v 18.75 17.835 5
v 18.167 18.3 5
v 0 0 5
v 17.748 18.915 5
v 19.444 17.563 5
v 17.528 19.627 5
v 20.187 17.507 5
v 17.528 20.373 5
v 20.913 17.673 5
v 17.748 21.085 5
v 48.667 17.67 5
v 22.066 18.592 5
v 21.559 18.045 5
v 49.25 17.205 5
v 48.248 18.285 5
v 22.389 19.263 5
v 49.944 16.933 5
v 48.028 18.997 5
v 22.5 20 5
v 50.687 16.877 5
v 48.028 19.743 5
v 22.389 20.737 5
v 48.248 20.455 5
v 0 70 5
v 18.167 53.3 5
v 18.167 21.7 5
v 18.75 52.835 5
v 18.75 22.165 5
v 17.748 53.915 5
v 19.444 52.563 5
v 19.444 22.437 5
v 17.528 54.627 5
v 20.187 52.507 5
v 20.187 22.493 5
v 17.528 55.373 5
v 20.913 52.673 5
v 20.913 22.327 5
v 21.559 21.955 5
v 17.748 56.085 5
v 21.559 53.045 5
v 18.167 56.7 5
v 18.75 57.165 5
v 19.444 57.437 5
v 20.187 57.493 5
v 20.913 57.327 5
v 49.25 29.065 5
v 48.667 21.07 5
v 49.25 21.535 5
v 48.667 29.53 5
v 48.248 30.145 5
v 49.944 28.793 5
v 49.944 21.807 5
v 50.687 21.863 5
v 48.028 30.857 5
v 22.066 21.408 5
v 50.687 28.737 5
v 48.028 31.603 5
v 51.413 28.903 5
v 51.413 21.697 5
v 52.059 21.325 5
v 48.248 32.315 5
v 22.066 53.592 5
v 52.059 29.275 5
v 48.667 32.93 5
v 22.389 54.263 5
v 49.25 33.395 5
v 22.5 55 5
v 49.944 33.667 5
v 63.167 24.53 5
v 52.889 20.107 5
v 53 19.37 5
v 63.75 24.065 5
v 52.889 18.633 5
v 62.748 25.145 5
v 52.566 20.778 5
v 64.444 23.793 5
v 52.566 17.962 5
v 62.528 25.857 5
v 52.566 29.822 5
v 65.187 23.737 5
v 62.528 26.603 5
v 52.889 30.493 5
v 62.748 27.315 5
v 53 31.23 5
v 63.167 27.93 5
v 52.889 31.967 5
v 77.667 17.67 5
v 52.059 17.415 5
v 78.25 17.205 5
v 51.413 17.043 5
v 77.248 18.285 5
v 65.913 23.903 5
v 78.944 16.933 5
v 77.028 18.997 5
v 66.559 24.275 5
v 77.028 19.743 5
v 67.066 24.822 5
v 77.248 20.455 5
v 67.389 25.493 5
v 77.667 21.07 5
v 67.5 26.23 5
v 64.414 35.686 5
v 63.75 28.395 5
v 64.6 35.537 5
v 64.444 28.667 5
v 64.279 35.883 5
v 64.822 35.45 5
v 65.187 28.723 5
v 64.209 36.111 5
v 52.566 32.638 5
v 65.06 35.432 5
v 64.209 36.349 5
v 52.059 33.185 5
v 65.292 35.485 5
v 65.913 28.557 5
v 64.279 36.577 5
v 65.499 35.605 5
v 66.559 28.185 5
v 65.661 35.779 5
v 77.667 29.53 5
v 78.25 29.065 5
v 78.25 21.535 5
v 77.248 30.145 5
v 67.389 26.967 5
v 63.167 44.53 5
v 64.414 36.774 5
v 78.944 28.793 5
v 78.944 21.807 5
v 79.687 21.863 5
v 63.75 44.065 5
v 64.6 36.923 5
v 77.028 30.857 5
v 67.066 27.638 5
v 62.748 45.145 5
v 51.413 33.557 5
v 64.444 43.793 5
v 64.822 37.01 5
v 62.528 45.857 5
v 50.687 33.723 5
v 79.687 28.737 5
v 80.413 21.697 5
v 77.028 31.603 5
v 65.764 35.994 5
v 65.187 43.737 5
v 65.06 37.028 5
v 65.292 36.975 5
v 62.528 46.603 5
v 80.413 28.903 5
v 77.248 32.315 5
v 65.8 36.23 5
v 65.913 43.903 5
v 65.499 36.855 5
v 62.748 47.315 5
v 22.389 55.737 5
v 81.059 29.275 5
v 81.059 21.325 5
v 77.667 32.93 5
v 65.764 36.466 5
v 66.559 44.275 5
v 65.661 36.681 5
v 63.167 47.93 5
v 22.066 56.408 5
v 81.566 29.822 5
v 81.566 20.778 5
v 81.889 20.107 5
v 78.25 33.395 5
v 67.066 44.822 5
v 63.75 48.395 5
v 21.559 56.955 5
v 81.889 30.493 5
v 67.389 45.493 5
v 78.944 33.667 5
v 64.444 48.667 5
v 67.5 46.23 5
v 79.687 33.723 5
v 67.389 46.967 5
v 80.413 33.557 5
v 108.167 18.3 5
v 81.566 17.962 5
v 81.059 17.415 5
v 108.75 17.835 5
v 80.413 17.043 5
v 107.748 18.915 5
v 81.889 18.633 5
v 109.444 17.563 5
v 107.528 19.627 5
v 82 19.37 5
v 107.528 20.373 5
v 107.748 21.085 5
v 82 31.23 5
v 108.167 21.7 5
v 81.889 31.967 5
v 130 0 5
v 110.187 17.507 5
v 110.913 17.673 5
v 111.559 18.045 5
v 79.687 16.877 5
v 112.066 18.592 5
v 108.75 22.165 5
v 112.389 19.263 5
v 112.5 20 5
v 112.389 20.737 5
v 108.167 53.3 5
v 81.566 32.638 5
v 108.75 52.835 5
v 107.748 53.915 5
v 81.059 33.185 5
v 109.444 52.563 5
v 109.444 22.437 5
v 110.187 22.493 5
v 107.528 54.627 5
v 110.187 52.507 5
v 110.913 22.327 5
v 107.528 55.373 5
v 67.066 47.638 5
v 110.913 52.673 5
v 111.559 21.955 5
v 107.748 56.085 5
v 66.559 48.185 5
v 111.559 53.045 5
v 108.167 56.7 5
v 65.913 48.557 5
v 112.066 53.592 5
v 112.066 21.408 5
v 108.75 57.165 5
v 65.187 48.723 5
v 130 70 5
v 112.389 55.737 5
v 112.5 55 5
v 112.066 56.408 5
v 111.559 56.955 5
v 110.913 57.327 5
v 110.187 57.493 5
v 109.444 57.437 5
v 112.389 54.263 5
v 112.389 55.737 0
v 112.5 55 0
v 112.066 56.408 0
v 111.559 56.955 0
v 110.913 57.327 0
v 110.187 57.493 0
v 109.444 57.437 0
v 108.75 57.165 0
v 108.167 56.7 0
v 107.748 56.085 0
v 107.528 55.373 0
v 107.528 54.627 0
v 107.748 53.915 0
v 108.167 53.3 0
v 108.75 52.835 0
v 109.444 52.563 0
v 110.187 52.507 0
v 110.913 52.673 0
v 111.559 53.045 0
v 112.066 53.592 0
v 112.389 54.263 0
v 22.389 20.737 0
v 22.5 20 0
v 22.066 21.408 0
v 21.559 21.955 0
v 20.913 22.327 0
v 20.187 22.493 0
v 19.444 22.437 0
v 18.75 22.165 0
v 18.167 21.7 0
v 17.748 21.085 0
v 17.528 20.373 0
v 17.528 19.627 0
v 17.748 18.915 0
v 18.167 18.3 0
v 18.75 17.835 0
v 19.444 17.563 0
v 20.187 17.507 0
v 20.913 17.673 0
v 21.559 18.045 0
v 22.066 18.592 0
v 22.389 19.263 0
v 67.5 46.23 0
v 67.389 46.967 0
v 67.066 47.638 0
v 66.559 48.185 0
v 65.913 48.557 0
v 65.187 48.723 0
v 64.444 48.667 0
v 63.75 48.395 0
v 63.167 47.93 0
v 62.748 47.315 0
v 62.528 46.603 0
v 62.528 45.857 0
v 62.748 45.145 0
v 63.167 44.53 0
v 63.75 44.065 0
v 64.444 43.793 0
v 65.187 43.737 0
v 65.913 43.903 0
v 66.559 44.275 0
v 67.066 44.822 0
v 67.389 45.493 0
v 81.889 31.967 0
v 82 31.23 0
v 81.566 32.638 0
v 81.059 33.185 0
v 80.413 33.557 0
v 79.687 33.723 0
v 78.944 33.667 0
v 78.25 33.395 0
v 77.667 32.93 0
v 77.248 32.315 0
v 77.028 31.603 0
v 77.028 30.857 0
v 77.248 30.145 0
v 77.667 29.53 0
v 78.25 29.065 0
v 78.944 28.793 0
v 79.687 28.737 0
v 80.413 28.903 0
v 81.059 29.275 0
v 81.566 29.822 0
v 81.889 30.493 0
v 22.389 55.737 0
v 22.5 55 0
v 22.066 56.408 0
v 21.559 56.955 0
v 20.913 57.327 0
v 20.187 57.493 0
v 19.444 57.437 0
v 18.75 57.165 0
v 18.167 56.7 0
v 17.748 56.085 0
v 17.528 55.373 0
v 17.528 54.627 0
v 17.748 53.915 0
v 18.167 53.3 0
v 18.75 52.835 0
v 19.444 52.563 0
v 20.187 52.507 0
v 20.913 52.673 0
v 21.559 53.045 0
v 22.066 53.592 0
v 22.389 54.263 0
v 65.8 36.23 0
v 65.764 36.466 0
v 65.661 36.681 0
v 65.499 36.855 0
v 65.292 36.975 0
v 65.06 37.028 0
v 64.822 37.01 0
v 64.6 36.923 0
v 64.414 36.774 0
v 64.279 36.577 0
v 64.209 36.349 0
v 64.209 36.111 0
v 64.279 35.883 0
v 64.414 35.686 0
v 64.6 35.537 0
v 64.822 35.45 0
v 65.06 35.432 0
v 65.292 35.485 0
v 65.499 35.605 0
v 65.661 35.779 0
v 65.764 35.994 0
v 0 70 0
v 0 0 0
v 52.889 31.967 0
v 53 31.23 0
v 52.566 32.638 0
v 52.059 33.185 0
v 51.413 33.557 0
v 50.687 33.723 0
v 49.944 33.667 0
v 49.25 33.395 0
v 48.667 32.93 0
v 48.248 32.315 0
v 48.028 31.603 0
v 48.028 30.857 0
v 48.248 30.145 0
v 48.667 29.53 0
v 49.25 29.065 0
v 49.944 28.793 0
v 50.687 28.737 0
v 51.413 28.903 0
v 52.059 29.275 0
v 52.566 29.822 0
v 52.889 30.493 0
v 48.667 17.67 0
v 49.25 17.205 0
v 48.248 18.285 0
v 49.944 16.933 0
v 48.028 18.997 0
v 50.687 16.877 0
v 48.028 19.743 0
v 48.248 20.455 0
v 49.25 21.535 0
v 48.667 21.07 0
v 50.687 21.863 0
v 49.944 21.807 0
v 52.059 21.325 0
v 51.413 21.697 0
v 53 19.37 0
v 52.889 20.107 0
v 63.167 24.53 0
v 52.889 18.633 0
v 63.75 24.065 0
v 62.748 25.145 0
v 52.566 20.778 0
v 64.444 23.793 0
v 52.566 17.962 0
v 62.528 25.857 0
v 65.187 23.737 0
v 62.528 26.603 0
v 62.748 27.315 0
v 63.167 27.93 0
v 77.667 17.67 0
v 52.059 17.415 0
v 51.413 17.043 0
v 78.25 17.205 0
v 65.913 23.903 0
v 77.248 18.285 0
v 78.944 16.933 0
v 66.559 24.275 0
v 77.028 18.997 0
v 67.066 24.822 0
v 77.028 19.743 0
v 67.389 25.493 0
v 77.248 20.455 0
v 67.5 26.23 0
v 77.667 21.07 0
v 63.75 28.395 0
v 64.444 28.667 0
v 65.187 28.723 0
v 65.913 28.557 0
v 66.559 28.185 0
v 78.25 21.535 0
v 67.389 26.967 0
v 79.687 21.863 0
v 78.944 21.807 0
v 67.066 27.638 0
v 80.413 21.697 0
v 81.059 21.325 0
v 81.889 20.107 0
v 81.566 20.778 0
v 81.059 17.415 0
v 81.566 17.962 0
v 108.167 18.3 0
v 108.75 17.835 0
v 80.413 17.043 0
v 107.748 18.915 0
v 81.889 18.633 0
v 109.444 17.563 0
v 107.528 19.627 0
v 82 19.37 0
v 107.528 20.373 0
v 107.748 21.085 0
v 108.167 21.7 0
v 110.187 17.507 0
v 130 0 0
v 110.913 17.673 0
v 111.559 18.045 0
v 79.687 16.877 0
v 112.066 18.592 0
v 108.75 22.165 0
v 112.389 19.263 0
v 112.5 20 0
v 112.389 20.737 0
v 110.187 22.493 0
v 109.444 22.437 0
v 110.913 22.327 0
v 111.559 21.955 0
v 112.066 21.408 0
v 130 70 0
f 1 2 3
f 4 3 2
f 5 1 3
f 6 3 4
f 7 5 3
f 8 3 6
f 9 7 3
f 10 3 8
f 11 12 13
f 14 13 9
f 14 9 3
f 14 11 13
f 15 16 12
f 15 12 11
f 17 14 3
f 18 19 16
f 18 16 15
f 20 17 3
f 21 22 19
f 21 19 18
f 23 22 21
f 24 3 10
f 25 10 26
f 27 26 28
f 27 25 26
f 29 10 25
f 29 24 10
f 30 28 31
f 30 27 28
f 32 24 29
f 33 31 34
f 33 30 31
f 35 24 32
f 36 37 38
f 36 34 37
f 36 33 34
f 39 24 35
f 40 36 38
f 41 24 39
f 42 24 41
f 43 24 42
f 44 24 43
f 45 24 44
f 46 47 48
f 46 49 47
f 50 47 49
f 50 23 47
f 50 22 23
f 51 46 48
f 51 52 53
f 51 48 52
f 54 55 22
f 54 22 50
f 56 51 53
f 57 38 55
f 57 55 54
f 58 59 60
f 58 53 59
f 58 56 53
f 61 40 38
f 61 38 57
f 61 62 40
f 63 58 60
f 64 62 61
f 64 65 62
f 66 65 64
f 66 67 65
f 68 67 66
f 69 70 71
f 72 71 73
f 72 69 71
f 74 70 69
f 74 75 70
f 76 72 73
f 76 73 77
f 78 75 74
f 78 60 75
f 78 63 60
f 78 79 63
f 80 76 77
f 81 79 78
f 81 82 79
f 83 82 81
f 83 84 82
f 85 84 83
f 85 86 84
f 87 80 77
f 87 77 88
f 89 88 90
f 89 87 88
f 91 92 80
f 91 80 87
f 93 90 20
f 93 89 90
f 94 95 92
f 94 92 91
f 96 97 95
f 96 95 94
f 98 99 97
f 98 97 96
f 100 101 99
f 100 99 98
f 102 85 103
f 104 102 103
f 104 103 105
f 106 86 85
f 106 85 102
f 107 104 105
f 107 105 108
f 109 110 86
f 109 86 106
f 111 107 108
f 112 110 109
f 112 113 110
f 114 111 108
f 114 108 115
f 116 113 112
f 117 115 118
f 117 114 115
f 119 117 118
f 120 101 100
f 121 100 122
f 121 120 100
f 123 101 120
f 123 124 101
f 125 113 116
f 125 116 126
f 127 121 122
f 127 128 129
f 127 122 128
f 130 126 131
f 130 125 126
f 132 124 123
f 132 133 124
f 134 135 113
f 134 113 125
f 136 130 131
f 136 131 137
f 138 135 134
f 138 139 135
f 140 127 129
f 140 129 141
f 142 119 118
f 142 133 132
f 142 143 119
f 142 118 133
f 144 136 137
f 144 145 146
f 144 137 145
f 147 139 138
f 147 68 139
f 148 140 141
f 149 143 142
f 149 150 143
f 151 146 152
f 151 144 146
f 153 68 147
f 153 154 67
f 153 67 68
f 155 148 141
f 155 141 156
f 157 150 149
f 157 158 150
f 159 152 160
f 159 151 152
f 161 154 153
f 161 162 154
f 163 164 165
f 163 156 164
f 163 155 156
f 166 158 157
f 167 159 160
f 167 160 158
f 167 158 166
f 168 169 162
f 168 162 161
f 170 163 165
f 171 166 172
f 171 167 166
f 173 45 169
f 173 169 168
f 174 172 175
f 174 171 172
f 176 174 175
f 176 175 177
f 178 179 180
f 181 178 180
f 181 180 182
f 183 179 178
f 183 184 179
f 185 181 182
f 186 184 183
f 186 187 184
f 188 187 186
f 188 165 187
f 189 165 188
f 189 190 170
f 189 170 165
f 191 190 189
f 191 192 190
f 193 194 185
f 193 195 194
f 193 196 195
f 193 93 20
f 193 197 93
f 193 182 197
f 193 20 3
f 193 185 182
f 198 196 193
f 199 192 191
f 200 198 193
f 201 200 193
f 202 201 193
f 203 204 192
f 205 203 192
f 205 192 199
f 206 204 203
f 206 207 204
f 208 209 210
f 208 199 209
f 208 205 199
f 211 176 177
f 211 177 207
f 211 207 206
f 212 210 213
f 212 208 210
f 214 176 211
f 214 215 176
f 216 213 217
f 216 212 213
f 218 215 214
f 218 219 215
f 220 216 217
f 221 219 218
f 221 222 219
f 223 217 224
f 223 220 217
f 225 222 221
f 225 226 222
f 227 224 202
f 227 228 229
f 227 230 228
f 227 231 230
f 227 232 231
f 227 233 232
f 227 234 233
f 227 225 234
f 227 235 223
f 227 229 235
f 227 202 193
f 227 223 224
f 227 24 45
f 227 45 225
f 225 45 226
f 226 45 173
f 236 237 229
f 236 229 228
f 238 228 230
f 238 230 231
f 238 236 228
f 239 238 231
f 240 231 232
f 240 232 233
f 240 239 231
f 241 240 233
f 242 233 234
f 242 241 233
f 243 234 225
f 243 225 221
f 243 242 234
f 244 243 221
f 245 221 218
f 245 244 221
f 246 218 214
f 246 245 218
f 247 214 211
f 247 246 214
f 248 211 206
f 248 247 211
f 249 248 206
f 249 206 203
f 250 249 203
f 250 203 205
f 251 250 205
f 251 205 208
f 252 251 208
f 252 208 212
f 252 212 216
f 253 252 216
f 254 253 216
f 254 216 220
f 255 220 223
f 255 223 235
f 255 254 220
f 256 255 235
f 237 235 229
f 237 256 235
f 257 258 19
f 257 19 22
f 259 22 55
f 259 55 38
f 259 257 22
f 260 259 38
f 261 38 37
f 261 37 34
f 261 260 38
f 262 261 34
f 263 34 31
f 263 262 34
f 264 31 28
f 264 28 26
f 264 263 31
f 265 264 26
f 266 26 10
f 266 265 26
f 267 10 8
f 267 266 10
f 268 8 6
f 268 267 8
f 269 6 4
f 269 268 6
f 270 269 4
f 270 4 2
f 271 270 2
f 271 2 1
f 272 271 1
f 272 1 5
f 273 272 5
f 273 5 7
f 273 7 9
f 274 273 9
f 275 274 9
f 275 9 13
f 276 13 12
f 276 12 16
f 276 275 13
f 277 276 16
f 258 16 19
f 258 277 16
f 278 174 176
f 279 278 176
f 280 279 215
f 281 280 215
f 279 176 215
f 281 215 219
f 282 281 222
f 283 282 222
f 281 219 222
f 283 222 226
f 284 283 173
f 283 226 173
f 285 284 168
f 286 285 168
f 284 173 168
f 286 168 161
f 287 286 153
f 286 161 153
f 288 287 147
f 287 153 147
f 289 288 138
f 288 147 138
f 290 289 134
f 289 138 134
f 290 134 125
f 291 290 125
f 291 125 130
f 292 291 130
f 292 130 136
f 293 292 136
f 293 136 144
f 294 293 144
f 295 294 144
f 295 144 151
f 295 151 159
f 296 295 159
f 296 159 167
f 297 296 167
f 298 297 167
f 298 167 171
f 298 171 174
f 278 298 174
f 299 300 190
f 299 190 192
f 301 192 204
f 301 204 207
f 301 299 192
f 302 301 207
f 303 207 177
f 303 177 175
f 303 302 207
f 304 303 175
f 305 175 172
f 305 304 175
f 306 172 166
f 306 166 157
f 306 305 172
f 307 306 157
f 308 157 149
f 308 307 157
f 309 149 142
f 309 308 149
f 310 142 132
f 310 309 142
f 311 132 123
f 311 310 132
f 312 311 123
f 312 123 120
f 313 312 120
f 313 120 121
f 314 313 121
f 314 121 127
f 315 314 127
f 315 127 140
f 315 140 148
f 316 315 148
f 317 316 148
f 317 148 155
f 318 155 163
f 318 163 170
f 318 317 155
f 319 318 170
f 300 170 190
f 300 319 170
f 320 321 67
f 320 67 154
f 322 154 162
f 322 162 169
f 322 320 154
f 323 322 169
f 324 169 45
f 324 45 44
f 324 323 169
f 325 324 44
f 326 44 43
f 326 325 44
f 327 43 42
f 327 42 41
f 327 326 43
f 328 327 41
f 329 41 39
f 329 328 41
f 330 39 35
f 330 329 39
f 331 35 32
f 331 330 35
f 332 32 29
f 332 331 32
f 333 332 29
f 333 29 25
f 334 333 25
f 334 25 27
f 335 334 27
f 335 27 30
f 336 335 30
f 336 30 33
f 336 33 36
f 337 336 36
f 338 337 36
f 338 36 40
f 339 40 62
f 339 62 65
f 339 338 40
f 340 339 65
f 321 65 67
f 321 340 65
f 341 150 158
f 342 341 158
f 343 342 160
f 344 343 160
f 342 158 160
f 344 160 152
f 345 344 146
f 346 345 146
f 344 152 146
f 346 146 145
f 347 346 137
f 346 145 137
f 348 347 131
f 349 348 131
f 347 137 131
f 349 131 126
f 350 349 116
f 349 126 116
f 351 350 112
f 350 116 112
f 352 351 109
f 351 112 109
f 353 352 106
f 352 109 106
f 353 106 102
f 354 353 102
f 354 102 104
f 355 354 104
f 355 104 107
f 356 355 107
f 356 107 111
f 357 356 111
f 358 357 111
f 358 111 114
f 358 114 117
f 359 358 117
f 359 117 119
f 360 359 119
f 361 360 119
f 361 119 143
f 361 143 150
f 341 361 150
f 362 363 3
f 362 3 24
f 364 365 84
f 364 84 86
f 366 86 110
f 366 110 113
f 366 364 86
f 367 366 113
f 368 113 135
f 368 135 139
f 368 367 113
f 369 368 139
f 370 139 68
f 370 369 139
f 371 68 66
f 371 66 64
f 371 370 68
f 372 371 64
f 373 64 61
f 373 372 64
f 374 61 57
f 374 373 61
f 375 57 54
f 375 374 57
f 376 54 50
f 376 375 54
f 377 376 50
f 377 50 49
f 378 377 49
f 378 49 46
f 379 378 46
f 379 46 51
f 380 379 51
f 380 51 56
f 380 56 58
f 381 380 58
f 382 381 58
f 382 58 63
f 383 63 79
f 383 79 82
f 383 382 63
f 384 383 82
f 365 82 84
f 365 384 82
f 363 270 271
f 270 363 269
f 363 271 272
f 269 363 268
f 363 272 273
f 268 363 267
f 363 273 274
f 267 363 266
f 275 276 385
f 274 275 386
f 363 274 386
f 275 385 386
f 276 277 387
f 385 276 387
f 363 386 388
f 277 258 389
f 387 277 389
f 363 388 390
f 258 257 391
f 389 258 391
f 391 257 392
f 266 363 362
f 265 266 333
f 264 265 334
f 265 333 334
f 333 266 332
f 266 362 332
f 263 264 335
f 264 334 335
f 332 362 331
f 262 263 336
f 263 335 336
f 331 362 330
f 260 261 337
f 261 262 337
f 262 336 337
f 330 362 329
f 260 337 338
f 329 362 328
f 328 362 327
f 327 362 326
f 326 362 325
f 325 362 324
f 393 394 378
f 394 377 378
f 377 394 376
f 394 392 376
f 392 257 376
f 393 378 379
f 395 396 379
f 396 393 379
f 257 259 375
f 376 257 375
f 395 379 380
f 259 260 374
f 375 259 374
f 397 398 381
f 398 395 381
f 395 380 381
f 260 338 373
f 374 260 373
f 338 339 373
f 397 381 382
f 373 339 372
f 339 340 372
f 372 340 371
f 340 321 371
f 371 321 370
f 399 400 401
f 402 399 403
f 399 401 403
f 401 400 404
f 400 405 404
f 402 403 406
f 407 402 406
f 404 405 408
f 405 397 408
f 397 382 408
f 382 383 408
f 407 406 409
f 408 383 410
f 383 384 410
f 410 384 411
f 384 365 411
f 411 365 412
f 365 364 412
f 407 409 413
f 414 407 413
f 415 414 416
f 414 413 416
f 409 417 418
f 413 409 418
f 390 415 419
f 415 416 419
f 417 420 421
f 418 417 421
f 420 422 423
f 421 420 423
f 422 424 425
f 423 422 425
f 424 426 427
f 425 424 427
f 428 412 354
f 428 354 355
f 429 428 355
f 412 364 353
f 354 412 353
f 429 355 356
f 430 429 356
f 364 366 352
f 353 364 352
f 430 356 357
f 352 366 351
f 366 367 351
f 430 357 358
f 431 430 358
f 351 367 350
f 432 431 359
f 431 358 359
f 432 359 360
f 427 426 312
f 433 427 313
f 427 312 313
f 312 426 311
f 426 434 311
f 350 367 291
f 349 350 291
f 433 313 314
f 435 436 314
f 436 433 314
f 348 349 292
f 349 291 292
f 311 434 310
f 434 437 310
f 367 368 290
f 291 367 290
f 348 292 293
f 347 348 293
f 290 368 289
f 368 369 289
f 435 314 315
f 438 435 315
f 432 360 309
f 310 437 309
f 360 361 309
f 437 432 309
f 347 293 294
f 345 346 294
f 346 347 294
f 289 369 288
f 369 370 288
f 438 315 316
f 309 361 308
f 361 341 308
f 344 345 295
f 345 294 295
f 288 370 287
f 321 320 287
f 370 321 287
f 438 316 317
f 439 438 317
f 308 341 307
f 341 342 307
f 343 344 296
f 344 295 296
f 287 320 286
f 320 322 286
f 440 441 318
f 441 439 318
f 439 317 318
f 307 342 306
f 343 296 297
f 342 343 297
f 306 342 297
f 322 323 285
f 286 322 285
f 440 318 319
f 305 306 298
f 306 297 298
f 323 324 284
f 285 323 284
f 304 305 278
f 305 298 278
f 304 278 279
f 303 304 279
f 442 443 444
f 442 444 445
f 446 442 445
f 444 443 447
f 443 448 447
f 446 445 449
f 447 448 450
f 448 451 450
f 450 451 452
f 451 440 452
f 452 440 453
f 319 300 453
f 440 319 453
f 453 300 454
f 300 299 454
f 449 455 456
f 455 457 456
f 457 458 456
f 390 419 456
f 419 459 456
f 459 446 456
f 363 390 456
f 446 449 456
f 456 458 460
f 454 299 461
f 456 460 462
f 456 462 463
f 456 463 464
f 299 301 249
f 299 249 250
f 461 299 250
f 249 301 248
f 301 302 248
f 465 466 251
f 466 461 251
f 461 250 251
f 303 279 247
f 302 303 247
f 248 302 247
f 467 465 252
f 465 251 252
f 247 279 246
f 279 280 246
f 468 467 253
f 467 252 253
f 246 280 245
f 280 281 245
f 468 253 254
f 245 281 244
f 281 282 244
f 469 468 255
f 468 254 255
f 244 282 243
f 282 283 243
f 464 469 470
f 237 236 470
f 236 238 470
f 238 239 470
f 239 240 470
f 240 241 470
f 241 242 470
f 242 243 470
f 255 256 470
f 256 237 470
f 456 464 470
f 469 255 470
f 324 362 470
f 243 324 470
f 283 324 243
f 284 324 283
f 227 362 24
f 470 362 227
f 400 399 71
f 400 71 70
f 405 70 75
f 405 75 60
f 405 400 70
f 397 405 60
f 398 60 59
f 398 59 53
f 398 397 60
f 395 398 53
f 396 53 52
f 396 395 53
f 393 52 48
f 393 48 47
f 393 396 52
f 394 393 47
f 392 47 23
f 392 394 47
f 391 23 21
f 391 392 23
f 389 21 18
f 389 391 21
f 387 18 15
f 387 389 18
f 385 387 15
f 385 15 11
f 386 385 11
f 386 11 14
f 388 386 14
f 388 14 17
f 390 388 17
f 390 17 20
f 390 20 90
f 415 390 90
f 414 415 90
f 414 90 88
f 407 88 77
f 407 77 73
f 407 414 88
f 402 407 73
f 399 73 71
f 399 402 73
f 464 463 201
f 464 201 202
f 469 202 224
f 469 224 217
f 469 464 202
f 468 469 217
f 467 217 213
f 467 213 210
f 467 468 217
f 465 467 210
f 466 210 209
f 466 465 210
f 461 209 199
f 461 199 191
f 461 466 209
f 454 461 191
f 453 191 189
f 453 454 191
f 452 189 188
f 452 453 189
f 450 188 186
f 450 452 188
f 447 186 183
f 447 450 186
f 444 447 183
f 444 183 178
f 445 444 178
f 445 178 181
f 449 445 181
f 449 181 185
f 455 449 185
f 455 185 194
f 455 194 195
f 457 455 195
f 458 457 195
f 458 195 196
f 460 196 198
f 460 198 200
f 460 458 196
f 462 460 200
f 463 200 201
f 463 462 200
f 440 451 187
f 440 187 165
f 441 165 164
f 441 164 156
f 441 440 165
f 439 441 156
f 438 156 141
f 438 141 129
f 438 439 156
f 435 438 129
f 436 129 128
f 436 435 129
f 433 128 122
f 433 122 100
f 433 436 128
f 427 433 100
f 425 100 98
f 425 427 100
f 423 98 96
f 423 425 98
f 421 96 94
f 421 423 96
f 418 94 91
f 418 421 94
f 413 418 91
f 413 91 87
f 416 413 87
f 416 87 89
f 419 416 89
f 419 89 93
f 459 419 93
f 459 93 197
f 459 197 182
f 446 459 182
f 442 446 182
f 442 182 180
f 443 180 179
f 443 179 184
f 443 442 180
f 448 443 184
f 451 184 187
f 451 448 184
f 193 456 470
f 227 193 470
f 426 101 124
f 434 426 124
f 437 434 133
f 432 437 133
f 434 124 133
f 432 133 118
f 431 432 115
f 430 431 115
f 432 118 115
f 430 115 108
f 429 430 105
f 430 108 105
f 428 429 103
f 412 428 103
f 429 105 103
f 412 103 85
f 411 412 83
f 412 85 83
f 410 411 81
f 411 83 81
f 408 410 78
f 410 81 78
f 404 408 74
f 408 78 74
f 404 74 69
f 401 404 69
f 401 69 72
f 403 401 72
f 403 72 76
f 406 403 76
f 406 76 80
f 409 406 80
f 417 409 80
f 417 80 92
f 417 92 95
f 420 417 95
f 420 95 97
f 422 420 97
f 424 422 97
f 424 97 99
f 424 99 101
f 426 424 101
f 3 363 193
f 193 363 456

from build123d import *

# Parameters (mm, degrees)
ESQUISSE1_W             = 130
ESQUISSE1_H             = 70
ESQUISSE1_R             = 2.5
BOSS_EXTRU_4_DEPTH      = 5
ESQUISSE2_R             = 0.8
ESQUISSE2_R_2           = 2.5
ENL_V_MAT_EXTRU_1_DEPTH = 10


with BuildPart() as part:
    # Esquisse1 → Boss.-Extru.4 (new body)
    with BuildSketch(Plane.XY):
        with Locations((65, 35)):
            Rectangle(ESQUISSE1_W, ESQUISSE1_H)
        with Locations((20, 55)):
            Circle(ESQUISSE1_R, mode=Mode.SUBTRACT)
        with Locations((110, 55)):
            Circle(ESQUISSE1_R, mode=Mode.SUBTRACT)
        with Locations((50.5, 31.23)):
            Circle(ESQUISSE1_R, mode=Mode.SUBTRACT)
        with Locations((79.5, 31.23)):
            Circle(ESQUISSE1_R, mode=Mode.SUBTRACT)
        with Locations((50.5, 19.37)):
            Circle(ESQUISSE1_R, mode=Mode.SUBTRACT)
        with Locations((79.5, 19.37)):
            Circle(ESQUISSE1_R, mode=Mode.SUBTRACT)
        with Locations((20, 20)):
            Circle(ESQUISSE1_R, mode=Mode.SUBTRACT)
        with Locations((110, 20)):
            Circle(ESQUISSE1_R, mode=Mode.SUBTRACT)
    extrude(amount=BOSS_EXTRU_4_DEPTH)

    # Esquisse2 → Enlèv. mat.-Extru.1 (cut)
    with BuildSketch(Plane.XY.offset(5)):
        with Locations((65, 36.23)):
            Circle(ESQUISSE2_R)
        with Locations((65, 26.23)):
            Circle(ESQUISSE2_R_2)
        with Locations((65, 46.23)):
            Circle(ESQUISSE2_R_2)
    extrude(amount=-ENL_V_MAT_EXTRU_1_DEPTH, mode=Mode.SUBTRACT)


solid = part.part
